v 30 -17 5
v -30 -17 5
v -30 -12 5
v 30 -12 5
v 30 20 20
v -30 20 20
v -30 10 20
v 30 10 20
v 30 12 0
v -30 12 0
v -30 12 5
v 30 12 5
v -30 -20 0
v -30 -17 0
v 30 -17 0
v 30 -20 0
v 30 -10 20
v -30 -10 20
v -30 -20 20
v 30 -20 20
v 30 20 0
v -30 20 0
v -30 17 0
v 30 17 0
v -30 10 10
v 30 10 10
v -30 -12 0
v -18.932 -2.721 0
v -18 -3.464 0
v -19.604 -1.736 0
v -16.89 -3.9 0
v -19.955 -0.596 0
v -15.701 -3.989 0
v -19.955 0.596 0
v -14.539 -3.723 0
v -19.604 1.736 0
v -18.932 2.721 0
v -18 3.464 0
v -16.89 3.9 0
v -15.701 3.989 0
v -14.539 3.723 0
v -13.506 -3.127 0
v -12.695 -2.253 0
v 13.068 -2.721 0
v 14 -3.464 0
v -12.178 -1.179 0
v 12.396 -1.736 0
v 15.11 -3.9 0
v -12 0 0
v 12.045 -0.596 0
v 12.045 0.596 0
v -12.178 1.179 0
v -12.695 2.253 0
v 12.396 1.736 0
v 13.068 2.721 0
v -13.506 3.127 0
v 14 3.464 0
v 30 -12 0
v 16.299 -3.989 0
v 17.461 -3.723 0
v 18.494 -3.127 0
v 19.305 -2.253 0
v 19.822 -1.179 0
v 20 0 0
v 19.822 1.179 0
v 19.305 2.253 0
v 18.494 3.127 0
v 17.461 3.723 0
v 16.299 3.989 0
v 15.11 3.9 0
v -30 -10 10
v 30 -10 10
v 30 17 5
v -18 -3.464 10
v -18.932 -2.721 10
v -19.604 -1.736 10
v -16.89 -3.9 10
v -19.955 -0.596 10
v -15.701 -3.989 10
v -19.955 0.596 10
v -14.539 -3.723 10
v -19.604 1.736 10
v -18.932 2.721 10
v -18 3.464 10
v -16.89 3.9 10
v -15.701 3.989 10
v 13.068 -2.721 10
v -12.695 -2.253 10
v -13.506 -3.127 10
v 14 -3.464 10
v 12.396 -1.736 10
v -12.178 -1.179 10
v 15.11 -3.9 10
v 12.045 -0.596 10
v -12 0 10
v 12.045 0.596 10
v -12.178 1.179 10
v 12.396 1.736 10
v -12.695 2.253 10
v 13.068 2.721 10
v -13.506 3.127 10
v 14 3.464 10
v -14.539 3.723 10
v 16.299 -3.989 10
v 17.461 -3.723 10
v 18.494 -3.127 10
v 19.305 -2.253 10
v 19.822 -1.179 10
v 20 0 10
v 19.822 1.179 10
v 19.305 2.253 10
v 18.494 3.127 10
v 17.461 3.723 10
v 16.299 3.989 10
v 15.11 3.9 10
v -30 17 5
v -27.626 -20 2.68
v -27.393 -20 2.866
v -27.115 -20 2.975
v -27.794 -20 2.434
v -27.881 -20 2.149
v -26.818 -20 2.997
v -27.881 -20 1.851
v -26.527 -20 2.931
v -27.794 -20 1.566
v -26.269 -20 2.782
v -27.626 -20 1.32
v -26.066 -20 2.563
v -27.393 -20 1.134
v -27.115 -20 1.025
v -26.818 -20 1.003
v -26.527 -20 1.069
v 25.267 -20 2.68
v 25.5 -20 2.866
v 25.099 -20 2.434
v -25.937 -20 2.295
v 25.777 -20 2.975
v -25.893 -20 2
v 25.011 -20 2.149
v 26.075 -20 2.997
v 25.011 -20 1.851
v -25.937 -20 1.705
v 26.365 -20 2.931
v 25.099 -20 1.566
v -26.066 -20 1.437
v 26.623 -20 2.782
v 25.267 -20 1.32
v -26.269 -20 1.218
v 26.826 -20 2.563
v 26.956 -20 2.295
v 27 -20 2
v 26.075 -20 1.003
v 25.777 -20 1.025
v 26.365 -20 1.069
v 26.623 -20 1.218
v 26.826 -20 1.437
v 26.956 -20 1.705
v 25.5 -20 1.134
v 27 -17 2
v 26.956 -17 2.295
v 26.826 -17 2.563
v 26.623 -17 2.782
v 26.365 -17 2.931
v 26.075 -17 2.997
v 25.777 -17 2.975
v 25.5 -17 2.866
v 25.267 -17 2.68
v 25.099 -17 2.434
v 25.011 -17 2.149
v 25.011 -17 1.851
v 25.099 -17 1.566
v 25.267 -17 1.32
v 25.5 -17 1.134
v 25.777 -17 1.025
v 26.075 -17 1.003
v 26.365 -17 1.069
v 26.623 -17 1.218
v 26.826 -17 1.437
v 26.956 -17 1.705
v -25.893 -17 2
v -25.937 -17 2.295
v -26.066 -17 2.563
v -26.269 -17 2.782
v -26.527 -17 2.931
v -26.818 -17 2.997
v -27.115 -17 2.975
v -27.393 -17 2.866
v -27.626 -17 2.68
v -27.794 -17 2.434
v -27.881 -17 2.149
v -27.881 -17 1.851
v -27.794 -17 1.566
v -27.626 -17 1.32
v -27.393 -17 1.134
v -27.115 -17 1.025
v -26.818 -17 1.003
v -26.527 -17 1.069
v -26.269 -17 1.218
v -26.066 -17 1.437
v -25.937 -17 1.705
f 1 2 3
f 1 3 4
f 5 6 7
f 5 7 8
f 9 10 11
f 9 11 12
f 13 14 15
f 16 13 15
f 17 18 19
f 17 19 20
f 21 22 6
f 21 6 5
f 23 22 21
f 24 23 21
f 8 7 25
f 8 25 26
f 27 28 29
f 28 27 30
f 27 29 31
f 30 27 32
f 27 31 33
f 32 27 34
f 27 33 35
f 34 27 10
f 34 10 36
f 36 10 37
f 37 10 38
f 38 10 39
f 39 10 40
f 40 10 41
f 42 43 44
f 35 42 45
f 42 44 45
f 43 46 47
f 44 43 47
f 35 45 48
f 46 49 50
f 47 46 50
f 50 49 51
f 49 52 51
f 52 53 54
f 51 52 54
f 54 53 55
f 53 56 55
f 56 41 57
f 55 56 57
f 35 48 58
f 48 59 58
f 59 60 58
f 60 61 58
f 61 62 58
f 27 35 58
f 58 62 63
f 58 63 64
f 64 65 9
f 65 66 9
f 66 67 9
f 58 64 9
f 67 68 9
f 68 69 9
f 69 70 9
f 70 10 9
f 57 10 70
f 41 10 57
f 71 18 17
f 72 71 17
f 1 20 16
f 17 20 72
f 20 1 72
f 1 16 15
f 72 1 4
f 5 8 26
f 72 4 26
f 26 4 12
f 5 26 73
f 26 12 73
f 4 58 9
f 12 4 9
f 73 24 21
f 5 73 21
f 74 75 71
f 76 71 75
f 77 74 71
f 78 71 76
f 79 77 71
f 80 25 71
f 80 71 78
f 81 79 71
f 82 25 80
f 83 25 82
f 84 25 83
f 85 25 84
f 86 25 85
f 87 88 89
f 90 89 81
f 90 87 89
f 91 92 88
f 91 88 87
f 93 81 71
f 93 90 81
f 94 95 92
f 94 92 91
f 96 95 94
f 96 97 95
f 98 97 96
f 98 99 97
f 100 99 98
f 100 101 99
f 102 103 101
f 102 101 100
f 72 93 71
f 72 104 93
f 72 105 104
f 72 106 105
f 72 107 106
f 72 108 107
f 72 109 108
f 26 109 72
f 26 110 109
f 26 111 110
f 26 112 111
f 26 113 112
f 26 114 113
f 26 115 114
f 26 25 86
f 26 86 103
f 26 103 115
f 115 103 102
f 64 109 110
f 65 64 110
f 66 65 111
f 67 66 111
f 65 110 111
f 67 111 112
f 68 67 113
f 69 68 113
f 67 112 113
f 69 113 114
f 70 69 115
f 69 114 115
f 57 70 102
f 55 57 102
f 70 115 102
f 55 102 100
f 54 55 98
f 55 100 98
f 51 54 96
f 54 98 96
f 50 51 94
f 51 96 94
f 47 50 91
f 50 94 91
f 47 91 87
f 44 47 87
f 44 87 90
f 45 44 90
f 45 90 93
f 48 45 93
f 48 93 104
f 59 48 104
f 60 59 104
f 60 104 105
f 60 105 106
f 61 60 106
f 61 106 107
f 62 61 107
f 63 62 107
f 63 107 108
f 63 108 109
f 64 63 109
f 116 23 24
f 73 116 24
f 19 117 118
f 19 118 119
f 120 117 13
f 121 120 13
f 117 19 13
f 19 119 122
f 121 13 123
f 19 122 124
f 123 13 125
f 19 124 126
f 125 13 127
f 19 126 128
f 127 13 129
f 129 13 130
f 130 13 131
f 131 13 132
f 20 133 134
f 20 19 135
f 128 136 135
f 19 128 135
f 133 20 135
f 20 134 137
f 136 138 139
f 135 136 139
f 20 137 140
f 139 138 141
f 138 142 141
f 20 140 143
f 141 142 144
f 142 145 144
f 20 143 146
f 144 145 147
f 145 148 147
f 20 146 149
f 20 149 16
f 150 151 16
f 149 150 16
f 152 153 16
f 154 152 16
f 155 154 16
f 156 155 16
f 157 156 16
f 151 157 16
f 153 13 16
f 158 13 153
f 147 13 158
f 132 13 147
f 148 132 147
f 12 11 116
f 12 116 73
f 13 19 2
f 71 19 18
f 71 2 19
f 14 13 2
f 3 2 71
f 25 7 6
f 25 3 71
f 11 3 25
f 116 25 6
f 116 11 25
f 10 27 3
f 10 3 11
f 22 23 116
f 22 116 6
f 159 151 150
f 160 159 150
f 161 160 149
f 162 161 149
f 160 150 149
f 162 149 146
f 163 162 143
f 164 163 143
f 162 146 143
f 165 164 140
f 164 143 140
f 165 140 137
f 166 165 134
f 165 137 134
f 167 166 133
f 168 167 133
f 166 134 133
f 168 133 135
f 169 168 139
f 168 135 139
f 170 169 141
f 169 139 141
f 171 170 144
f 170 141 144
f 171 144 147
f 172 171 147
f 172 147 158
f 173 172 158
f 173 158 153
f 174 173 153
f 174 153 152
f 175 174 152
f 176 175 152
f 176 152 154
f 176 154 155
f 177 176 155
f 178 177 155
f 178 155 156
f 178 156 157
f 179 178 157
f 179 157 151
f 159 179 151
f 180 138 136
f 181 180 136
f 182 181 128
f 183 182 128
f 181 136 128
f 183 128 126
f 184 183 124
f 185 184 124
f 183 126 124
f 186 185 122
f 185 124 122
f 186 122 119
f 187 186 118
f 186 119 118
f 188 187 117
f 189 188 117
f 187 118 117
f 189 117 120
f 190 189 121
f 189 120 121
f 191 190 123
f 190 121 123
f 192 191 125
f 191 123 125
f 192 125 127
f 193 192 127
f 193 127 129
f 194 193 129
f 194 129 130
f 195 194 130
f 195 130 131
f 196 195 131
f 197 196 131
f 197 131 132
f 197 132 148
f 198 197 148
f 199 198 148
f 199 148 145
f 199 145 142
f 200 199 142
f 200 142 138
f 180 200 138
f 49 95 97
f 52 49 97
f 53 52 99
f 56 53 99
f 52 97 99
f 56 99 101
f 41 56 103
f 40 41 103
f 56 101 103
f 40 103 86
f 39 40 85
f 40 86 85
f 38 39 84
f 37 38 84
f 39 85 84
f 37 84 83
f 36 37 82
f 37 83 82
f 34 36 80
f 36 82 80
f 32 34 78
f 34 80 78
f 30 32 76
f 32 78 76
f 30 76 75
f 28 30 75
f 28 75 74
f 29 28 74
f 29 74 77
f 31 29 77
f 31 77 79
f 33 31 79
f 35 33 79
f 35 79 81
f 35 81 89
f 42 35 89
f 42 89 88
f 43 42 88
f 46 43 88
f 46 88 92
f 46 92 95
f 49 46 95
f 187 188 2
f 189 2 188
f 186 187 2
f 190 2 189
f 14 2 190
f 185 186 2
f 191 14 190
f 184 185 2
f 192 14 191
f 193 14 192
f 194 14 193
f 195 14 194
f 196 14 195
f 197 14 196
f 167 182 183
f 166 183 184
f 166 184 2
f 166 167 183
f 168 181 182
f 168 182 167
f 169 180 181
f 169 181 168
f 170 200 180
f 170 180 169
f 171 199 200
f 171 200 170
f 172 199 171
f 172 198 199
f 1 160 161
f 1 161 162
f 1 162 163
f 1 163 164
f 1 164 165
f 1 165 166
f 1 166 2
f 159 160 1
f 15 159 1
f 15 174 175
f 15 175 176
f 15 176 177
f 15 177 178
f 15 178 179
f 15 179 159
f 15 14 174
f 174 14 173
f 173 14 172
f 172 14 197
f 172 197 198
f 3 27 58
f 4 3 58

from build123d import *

# Parameters (mm, degrees)
F0_W      = 60
F0_H      = 40
F1_DEPTH  = 20
F2_W      = 60
F2_H      = 20
F3_DEPTH  = 10
F4_R      = 4
F5_DEPTH  = 25
F6_R      = 4
F7_DEPTH  = 25
F8_W      = 60
F8_H      = 5
F9_DEPTH  = 5
F10_W     = 60
F10_H     = 5
F11_DEPTH = 5
F12_R     = 1
F13_DEPTH = 5
F14_R     = 1
F15_DEPTH = 5


with BuildPart() as f1:
    # F0 (on Top) → F1 (new body)
    with BuildSketch(Plane.XY):
        Rectangle(F0_W, F0_H)
    extrude(amount=F1_DEPTH)

    # F2 (on face) → F3 (cut)
    with BuildSketch(Plane.XY.offset(20)):
        Rectangle(F2_W, F2_H)
    extrude(amount=-F3_DEPTH, mode=Mode.SUBTRACT)

    # F4 (on face) → F5 (cut)
    with BuildSketch(Plane.XY.offset(10)):
        with Locations((-16, 0)):
            Circle(F4_R)
    extrude(amount=-F5_DEPTH, mode=Mode.SUBTRACT)

    # F6 (on face) → F7 (cut)
    with BuildSketch(Plane.XY.offset(10)):
        with Locations((16, 0)):
            Circle(F6_R)
    extrude(amount=-F7_DEPTH, mode=Mode.SUBTRACT)

    # F8 (on face) → F9 (cut)
    with BuildSketch(Plane(origin=(0, 0, 0), x_dir=(1, 0, 0), z_dir=(0, 0, -1))):
        with Locations((0, 14.5)):
            Rectangle(F8_W, F8_H)
    extrude(amount=-F9_DEPTH, mode=Mode.SUBTRACT)

    # F10 (on face) → F11 (cut)
    with BuildSketch(Plane(origin=(0, 0, 0), x_dir=(1, 0, 0), z_dir=(0, 0, -1))):
        with Locations((0, -14.5)):
            Rectangle(F10_W, F10_H)
    extrude(amount=-F11_DEPTH, mode=Mode.SUBTRACT)

    # F12 (on face) → F13 (cut)
    with BuildSketch(Plane.XZ.offset(20)):
        with Locations((-26.892597, 2)):
            Circle(F12_R)
    extrude(amount=-F13_DEPTH, mode=Mode.SUBTRACT)

    # F14 (on face) → F15 (cut)
    with BuildSketch(Plane.XZ.offset(20)):
        with Locations((26, 2)):
            Circle(F14_R)
    extrude(amount=-F15_DEPTH, mode=Mode.SUBTRACT)


solid = f1.part
